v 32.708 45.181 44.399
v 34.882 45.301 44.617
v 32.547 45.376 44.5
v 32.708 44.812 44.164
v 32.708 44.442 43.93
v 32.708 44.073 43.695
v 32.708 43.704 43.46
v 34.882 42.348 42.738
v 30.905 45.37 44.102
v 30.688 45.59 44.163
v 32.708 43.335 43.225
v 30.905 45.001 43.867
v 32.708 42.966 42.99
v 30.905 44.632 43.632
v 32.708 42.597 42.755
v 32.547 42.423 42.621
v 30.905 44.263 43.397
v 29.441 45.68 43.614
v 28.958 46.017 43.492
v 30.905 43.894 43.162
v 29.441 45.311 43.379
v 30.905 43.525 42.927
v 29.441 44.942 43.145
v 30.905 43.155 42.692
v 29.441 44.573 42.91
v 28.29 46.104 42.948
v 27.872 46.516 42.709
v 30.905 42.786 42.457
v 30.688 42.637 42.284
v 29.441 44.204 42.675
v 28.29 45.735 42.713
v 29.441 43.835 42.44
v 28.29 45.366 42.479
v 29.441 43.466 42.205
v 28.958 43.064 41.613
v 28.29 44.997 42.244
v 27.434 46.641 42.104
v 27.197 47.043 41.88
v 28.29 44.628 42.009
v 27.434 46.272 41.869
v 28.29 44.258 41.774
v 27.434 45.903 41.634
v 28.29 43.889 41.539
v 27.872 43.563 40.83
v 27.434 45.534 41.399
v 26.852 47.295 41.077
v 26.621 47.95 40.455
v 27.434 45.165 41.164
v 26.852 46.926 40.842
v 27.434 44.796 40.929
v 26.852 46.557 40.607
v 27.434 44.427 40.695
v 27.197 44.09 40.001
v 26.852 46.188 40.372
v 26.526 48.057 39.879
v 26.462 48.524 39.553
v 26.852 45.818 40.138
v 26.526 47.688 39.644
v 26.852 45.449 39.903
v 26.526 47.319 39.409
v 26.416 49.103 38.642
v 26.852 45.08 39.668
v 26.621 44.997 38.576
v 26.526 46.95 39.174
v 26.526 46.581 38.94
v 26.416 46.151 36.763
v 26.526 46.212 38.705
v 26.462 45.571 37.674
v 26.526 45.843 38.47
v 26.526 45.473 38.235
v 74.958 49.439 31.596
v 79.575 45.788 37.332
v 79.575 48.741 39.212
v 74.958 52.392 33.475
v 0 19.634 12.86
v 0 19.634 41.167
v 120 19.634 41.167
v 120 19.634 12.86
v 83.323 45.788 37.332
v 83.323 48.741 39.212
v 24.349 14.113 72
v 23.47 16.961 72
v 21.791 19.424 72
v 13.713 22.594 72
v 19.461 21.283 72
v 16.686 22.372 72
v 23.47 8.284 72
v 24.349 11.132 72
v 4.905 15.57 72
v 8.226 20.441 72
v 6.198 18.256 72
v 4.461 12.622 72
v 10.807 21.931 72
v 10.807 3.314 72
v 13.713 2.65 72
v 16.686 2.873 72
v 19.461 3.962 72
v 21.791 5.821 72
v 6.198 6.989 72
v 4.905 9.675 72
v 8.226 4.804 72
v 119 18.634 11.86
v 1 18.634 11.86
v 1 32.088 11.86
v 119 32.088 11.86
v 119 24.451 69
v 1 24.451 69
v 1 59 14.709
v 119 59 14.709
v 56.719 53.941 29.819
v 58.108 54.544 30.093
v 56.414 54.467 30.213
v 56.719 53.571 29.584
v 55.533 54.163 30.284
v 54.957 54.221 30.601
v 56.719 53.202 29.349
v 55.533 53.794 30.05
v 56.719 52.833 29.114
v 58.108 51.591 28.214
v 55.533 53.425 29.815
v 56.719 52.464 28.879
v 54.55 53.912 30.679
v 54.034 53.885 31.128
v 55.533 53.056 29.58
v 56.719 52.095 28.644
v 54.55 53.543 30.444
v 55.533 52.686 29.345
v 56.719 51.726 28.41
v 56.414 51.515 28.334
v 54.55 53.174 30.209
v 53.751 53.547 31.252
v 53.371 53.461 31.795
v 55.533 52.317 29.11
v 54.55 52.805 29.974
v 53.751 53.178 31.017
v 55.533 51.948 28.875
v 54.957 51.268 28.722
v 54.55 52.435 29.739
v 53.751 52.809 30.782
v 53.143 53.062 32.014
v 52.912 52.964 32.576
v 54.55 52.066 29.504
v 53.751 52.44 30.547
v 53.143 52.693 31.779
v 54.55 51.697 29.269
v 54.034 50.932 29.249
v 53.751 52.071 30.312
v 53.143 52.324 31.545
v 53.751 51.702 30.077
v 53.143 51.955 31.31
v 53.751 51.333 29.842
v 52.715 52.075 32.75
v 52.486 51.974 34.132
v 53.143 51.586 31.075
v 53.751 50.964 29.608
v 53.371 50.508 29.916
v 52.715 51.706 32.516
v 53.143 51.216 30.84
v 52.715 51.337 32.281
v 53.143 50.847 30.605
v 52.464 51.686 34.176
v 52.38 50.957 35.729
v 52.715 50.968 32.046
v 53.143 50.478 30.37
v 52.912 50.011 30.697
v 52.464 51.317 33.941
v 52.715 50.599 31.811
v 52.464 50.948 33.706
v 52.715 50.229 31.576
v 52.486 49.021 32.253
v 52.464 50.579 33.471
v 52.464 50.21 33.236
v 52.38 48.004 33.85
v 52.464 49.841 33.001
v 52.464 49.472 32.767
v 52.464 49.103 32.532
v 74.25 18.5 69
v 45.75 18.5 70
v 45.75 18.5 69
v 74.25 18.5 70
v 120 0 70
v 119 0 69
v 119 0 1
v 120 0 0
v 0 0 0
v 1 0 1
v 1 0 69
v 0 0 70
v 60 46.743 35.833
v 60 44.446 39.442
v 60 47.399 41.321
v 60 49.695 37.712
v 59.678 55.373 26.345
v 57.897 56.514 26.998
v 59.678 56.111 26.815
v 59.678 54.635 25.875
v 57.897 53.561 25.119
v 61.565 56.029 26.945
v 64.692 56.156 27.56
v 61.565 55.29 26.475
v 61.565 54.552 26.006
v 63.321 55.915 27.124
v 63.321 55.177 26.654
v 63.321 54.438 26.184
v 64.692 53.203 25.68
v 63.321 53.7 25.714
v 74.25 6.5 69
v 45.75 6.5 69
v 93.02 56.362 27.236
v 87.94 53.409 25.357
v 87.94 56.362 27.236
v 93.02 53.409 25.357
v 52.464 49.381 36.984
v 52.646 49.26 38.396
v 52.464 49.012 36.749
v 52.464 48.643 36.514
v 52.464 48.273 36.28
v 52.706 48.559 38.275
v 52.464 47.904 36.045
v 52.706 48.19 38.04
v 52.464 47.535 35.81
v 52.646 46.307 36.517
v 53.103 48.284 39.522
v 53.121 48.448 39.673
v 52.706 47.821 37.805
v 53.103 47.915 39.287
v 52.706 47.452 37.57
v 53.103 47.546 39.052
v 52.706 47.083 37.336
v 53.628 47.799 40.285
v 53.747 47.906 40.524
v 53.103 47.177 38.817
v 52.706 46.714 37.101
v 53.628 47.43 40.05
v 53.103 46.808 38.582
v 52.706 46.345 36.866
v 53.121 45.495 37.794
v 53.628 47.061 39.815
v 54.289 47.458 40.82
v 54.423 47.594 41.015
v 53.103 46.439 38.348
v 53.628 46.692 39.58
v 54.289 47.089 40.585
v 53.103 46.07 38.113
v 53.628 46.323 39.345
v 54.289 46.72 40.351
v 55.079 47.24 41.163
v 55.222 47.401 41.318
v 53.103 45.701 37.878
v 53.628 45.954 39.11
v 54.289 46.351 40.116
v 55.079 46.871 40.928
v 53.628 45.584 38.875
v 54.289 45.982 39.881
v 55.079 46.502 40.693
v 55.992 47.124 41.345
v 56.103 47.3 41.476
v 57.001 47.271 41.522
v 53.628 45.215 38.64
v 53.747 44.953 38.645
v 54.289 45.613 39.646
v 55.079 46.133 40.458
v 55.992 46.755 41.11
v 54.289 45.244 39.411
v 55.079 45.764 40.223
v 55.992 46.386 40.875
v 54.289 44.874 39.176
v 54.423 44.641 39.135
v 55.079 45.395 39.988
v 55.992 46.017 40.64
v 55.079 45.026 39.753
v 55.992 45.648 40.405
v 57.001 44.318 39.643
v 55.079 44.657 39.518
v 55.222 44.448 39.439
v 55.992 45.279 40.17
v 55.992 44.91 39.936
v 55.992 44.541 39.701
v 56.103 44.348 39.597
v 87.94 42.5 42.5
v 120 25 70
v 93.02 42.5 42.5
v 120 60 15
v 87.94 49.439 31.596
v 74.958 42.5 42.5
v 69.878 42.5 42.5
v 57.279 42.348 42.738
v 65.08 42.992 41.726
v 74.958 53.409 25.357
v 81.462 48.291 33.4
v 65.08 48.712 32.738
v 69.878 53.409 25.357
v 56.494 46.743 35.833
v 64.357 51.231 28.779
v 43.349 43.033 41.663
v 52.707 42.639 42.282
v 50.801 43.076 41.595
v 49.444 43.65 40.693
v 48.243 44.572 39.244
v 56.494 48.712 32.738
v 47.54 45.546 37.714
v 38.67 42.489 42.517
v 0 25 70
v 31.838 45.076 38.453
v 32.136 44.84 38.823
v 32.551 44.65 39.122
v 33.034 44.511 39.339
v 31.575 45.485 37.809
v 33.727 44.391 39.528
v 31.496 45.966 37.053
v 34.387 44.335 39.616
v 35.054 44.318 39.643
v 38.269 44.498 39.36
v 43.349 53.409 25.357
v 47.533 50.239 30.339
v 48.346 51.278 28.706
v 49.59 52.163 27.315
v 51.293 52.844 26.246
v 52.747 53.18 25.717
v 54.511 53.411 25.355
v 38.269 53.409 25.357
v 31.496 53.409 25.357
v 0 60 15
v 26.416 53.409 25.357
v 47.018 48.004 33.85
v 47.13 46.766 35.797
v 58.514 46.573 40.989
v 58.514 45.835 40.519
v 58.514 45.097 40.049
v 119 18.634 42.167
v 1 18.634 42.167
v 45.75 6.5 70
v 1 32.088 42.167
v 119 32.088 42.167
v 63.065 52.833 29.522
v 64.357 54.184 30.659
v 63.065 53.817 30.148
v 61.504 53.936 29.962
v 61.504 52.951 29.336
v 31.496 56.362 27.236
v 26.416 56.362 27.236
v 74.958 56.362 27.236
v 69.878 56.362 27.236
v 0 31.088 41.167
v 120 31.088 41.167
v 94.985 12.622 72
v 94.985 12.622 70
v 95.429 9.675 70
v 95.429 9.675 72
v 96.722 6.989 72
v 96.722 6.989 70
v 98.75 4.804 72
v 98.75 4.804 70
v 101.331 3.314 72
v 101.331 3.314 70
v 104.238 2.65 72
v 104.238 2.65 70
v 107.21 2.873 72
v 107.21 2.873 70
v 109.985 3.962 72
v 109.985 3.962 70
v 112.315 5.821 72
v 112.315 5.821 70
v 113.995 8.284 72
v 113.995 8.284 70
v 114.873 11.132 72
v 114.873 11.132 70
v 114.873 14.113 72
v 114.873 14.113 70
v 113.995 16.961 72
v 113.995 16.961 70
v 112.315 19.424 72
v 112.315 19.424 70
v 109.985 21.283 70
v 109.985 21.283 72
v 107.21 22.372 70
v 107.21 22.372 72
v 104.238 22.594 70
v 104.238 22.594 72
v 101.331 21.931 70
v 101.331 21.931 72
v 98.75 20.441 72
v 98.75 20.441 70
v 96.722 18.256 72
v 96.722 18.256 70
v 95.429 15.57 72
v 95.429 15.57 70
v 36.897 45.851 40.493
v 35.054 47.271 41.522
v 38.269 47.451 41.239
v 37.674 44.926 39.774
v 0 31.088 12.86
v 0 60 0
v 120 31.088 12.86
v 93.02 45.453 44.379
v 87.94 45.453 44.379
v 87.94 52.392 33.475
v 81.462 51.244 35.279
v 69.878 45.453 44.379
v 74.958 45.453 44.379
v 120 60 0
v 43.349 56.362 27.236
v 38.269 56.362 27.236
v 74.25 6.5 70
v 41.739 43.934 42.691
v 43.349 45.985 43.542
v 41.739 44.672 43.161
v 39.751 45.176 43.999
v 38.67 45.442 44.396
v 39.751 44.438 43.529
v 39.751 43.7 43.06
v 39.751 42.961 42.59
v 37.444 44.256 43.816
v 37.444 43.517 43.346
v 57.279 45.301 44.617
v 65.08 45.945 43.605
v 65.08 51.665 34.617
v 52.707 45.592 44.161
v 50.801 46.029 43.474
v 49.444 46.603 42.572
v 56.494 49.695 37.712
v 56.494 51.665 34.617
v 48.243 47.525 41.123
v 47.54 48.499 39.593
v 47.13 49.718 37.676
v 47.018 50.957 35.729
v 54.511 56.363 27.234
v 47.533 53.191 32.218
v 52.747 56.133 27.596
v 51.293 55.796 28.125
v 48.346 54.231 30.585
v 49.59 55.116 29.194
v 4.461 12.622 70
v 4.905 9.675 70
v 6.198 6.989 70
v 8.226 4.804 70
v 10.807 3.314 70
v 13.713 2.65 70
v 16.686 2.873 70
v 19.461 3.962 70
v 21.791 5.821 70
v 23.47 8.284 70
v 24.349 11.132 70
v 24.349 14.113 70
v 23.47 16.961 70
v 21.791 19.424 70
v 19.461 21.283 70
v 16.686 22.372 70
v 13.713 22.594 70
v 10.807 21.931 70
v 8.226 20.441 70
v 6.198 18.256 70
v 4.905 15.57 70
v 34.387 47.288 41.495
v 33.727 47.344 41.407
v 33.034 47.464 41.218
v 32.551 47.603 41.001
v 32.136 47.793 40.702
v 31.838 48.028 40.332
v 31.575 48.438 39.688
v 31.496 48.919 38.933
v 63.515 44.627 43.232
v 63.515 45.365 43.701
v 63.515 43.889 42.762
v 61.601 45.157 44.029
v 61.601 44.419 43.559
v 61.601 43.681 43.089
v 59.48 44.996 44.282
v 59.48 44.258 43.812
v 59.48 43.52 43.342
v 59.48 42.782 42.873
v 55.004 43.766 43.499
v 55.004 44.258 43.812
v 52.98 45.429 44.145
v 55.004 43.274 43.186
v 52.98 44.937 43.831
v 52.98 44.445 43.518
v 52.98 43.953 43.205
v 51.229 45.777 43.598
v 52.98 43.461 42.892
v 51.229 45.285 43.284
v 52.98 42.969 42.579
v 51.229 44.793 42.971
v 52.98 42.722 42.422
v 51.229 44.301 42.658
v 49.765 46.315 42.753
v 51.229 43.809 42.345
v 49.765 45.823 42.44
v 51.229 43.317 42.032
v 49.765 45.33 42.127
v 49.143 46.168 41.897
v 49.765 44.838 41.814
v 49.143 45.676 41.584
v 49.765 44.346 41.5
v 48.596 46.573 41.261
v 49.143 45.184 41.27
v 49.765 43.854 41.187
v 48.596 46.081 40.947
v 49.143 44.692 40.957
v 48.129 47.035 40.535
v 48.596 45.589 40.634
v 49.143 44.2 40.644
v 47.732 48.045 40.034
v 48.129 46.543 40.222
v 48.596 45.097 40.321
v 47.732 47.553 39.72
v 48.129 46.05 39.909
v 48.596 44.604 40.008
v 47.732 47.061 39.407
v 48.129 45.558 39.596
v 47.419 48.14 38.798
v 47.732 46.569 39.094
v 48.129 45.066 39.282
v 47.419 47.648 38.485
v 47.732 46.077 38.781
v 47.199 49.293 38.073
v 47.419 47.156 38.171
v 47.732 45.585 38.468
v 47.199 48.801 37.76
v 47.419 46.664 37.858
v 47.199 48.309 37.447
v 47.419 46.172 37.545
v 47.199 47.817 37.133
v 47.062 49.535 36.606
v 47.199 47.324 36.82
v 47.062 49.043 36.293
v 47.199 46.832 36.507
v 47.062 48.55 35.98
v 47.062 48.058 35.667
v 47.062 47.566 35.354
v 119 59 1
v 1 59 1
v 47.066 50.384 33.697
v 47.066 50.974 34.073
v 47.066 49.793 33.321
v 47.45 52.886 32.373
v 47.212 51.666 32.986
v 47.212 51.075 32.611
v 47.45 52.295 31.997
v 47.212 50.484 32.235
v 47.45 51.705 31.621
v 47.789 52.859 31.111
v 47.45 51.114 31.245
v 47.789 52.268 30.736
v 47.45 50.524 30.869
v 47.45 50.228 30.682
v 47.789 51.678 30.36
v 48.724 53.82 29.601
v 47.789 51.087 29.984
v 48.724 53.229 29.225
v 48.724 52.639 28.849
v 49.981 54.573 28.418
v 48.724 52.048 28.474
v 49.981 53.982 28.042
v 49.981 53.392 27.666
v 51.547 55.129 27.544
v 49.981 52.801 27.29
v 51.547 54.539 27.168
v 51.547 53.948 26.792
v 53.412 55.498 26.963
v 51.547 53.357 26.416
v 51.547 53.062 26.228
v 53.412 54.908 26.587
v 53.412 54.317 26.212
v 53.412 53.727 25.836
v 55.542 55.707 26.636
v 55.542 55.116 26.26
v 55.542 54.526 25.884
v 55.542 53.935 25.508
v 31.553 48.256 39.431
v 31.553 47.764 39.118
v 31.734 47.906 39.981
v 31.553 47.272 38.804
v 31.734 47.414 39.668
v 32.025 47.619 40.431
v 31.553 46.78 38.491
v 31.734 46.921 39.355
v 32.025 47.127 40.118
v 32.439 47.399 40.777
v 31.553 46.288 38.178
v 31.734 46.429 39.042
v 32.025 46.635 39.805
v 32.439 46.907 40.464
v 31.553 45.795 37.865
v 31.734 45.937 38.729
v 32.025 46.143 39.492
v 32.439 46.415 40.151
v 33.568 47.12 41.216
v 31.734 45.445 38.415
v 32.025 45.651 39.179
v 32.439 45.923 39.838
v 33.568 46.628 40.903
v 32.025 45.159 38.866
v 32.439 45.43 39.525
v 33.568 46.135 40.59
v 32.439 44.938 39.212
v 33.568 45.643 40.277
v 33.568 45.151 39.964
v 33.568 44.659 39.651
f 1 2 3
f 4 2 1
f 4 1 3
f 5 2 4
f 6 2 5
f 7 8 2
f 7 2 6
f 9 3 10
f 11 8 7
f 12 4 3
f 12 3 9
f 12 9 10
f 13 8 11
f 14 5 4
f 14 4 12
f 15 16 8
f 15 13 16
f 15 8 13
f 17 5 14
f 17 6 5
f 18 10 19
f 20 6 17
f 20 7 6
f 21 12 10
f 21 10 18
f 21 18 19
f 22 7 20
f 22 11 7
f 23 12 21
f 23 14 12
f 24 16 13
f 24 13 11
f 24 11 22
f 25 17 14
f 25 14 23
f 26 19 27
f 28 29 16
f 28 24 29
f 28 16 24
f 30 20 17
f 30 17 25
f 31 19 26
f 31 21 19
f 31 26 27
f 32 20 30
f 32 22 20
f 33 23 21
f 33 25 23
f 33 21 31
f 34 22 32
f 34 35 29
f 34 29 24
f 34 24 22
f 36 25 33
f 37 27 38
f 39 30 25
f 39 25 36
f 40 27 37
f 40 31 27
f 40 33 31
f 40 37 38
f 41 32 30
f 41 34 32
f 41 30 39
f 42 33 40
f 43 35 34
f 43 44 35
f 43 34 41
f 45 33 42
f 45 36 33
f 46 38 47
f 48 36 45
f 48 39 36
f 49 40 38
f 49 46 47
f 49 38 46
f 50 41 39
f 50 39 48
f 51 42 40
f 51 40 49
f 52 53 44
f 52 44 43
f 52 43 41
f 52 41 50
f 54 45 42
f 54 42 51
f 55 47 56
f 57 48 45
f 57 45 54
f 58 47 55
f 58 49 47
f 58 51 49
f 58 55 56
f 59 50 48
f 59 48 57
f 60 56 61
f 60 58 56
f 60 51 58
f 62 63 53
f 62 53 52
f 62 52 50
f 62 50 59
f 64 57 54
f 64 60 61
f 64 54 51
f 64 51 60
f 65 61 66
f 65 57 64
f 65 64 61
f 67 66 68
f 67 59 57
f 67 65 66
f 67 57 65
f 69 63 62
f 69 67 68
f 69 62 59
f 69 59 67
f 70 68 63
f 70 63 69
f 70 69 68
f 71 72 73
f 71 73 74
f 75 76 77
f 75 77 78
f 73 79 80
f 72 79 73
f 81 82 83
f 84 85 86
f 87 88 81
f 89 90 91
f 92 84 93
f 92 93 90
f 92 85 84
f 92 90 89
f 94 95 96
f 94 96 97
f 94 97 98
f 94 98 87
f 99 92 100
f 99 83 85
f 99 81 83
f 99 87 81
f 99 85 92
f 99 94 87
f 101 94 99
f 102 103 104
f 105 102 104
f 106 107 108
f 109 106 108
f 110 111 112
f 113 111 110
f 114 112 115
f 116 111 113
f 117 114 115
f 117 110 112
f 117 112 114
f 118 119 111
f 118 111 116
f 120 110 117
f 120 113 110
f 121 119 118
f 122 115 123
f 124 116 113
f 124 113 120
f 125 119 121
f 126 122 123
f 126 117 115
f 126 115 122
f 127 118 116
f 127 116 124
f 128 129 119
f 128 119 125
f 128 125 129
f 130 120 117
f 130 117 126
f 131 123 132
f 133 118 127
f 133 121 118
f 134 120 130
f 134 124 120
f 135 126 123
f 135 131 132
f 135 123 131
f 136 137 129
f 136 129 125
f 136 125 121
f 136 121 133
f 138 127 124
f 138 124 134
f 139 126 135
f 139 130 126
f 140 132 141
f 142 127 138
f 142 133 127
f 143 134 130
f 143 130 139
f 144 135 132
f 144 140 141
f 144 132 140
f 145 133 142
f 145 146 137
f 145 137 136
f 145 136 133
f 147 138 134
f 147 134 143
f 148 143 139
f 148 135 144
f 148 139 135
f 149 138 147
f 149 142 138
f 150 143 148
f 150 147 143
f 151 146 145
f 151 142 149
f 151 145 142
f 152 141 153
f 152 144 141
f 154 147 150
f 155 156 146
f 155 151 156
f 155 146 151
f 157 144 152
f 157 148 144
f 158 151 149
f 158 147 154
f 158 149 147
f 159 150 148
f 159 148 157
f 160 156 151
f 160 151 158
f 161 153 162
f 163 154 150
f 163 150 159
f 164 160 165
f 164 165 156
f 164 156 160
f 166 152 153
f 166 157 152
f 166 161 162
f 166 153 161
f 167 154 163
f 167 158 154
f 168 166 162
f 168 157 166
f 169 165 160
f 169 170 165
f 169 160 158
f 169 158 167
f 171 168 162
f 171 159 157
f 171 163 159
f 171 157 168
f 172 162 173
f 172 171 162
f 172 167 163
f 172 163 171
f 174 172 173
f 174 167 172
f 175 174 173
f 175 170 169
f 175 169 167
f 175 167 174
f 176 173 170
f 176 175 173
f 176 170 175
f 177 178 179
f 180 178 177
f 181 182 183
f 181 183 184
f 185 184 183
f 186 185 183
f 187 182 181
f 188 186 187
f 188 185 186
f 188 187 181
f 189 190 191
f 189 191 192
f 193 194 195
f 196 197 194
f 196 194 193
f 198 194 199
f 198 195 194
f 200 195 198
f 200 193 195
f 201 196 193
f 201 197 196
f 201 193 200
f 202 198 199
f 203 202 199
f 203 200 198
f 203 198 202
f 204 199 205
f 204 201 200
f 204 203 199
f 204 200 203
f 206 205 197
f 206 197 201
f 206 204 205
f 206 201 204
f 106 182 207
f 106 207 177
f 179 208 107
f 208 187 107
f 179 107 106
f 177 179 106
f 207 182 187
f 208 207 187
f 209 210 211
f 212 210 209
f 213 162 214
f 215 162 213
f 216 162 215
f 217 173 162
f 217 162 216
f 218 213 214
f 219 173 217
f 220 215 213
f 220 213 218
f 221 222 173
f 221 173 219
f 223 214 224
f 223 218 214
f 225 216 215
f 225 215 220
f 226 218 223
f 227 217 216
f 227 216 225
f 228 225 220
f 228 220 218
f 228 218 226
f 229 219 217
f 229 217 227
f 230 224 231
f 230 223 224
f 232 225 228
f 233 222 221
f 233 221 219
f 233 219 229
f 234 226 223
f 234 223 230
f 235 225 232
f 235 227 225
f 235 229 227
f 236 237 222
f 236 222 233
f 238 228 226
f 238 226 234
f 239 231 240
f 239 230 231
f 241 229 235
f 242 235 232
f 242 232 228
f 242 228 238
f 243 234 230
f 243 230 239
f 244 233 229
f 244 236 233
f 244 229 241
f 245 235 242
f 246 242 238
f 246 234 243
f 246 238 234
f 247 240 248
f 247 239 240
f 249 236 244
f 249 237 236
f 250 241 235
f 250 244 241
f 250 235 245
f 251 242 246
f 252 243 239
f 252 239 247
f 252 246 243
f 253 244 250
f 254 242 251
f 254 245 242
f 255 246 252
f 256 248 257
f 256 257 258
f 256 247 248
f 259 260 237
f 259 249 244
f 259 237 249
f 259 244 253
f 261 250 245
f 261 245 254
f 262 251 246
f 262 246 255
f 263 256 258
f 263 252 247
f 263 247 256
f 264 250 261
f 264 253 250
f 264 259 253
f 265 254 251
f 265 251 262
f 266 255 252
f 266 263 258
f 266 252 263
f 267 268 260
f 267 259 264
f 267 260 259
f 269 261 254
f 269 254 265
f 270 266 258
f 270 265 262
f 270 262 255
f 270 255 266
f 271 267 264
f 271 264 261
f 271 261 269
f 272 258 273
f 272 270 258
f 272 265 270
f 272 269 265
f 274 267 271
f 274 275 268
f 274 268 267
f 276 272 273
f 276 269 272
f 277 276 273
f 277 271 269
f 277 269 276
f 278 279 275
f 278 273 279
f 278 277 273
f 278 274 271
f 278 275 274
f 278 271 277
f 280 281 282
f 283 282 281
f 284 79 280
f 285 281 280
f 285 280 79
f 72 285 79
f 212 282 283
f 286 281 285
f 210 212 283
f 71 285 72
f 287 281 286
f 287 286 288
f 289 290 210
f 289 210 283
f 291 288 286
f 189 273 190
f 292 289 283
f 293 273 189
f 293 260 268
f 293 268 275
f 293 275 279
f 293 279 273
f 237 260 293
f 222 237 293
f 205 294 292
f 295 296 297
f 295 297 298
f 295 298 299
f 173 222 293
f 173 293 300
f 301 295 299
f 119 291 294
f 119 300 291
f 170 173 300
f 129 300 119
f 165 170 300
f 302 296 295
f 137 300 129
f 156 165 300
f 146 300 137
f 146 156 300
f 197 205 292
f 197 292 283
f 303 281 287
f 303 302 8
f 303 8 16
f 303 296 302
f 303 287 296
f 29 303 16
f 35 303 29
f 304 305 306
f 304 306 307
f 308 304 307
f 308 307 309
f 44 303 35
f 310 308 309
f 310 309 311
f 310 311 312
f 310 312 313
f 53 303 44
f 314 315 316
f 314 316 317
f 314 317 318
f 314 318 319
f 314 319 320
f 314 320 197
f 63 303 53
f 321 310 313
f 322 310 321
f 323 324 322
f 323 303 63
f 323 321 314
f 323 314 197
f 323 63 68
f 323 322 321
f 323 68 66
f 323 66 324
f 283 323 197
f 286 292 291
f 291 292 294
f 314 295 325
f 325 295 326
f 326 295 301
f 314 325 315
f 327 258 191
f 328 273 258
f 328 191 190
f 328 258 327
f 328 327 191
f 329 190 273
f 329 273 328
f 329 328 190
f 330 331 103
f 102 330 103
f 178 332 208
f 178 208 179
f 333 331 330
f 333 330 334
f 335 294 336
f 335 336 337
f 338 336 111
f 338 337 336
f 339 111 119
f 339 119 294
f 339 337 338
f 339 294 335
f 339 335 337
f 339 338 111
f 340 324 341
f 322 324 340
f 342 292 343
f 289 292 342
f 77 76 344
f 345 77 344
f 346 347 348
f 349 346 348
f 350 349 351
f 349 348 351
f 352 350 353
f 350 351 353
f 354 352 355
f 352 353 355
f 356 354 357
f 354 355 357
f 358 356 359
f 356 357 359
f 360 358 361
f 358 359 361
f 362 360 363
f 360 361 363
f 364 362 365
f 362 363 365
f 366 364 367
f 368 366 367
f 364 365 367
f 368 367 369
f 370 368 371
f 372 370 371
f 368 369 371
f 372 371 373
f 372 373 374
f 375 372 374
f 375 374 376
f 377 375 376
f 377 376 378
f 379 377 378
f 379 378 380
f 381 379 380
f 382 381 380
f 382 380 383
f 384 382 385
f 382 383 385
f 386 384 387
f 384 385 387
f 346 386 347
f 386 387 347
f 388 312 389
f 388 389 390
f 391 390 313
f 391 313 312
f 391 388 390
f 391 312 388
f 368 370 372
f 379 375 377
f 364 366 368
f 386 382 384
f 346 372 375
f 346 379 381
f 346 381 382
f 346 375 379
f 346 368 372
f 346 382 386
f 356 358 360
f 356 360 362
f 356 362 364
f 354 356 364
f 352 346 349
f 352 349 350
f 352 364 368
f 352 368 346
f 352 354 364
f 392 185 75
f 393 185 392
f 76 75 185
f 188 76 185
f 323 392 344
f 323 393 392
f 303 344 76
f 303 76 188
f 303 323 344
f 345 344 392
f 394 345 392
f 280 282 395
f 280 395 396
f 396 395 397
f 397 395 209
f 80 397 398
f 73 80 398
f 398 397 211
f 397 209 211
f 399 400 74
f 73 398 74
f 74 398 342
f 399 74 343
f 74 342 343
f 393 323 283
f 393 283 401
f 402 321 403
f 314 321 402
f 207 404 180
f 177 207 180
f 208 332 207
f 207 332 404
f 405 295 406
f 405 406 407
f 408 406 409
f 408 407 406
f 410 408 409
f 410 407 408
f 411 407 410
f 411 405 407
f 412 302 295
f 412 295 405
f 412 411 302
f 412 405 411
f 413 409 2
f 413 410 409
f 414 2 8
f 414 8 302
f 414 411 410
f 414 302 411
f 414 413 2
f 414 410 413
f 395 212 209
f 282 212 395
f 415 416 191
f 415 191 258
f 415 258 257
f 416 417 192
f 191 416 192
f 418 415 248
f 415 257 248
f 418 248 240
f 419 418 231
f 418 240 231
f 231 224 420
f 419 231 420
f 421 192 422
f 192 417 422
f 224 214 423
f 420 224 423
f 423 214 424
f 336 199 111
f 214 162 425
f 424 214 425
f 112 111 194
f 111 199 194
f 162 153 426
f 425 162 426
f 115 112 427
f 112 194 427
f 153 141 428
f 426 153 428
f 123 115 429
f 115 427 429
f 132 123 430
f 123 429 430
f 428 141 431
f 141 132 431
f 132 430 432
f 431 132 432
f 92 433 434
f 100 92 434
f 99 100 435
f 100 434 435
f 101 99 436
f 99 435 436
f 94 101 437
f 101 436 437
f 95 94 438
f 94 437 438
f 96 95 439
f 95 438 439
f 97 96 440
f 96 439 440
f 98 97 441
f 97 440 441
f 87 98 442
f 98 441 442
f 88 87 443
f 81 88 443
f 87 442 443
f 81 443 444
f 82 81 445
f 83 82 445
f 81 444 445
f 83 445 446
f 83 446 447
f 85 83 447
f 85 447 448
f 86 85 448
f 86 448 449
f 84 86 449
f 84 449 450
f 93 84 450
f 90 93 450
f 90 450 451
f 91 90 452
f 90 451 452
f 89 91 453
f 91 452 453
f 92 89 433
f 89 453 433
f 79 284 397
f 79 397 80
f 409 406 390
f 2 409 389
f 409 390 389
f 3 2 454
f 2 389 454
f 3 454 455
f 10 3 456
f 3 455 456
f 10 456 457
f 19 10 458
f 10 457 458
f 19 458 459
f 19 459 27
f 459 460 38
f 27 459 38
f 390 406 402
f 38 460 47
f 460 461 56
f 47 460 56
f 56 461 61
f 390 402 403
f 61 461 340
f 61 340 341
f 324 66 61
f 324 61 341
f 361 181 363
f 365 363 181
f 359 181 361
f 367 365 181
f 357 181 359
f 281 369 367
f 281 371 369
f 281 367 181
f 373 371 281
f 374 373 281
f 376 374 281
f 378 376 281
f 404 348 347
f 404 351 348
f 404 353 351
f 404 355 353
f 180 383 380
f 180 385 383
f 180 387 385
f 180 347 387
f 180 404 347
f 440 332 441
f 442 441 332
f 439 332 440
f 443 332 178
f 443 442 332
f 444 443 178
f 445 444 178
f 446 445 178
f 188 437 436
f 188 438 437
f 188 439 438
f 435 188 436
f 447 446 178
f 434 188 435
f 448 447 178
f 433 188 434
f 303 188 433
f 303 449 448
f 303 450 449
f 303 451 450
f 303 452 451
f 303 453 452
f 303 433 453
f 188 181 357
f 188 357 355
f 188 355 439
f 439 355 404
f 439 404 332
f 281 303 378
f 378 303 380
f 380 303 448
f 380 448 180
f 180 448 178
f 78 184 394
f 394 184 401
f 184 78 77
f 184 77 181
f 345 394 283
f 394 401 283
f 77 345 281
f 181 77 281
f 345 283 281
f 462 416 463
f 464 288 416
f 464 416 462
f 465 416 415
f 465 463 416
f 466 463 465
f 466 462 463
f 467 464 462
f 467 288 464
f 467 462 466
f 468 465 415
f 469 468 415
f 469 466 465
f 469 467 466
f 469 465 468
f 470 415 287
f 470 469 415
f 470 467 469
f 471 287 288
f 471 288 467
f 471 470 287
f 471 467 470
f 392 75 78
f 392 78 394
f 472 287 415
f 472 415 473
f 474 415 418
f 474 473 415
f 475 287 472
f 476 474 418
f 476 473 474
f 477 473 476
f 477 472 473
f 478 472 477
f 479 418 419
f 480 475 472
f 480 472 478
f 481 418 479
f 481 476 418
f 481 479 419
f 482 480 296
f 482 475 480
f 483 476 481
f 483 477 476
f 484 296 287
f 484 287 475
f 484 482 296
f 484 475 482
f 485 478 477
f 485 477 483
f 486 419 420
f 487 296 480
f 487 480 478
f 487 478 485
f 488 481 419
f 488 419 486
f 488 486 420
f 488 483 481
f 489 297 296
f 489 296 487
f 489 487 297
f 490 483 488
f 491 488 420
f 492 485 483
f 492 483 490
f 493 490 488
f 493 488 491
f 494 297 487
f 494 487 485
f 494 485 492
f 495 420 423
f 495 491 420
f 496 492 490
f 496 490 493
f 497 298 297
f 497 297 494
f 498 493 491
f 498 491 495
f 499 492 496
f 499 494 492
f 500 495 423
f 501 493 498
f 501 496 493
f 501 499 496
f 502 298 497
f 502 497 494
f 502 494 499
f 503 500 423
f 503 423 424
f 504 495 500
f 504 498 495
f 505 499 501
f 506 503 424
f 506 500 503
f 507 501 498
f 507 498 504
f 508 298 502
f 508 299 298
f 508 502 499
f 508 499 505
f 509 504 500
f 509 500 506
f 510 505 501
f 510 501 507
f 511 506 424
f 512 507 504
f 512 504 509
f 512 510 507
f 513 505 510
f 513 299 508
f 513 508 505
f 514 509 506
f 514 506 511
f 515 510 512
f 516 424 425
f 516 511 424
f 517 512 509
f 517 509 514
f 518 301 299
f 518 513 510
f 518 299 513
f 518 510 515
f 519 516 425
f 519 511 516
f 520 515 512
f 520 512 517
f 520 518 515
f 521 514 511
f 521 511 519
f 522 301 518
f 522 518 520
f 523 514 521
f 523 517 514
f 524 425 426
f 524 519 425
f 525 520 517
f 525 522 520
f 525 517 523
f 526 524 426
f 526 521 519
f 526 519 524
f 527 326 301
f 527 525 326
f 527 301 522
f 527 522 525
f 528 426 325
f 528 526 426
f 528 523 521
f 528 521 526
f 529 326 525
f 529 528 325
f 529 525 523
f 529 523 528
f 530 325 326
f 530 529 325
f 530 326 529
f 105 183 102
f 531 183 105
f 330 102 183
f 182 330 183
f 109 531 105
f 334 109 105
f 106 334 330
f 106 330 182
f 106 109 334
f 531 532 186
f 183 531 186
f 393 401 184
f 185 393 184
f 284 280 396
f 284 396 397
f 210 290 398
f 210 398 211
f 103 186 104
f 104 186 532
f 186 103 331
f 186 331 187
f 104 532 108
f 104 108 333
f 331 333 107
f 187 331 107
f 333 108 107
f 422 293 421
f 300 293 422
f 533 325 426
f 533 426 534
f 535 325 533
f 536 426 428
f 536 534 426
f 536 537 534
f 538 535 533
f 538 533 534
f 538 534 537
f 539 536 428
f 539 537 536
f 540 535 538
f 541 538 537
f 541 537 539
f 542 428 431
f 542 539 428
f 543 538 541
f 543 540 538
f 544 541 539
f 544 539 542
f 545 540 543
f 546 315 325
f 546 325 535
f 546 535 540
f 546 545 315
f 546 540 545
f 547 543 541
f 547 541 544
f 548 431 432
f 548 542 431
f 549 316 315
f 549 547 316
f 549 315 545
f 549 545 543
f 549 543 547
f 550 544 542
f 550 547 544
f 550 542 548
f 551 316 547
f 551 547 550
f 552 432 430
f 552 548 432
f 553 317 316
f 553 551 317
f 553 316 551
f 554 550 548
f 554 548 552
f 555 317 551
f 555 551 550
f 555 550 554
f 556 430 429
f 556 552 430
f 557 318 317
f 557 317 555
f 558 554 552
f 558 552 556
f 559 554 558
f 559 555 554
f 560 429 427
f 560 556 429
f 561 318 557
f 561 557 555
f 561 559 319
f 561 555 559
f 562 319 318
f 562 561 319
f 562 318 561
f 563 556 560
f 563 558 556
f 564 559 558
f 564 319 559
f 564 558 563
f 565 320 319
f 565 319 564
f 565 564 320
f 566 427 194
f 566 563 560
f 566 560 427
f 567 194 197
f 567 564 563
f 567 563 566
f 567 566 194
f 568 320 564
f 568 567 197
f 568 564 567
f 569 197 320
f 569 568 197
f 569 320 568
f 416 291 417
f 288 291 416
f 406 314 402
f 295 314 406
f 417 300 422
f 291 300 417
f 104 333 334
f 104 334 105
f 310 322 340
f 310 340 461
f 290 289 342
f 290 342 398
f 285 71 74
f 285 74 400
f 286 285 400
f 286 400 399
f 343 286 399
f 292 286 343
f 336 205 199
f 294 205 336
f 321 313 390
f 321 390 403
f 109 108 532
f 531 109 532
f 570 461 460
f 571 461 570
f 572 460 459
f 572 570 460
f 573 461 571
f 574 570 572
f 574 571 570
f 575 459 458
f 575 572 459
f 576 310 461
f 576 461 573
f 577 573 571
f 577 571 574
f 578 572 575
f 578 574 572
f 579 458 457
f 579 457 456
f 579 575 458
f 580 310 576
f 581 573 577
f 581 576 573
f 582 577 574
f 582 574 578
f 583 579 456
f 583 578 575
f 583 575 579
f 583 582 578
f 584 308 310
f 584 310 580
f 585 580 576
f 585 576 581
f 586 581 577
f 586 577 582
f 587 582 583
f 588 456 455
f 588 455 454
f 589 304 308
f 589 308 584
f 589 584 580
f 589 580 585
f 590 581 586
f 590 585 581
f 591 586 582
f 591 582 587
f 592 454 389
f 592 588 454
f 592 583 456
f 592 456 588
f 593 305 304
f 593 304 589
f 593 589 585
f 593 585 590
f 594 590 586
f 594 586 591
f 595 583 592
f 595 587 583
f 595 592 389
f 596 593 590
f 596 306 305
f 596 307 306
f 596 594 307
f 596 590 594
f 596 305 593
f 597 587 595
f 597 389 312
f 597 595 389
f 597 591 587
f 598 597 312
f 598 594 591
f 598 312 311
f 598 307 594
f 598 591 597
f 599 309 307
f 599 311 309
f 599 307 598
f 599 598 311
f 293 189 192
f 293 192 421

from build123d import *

# Parameters (mm, degrees)
SKETCH2_W           = 28.306958552
SKETCH2_H           = 11.453917389
BOSS_EXTRUDE1_DEPTH = 120
SHELL1_T            = -1
SKETCH3_R           = 10
BOSS_EXTRUDE3_DEPTH = 2
BOSS_EXTRUDE4_DEPTH = 3.5
SKETCH5_W           = 28.5
SKETCH5_H           = 12
CUT_EXTRUDE1_DEPTH  = 3.5


with BuildPart() as part:
    # Sketch2 → Boss-Extrude1 (new body)
    with BuildSketch(Plane(origin=(0, 0, 0), x_dir=(0, 0, -1), z_dir=(1, 0, 0))):
        Polygon((0, 0), (-70, 0), (-70, 25), (-15, 60), (0, 60), align=None)
        with Locations((-27.013142097, 25.361400481)):
            Rectangle(SKETCH2_W, SKETCH2_H, mode=Mode.SUBTRACT)
    extrude(amount=BOSS_EXTRUDE1_DEPTH)

    # Shell1
    shell1_openings = [part.faces().sort_by_distance(p)[0] for p in [
        (60, 0, 35),
    ]]
    offset(amount=SHELL1_T, openings=shell1_openings, kind=Kind.INTERSECTION)

    # Sketch3 → Boss-Extrude3 (add)
    with BuildSketch(Plane.XY.offset(70)):
        with Locations(Location((14.460503184, 12.622362689, 0), (0, 0, 180))):
            Circle(SKETCH3_R)
        with Locations(Location((104.984833399, 12.622362689, 0), (0, 0, 180))):
            Circle(SKETCH3_R)
    extrude(amount=BOSS_EXTRUDE3_DEPTH)

    # Sketch4 → Boss-Extrude4 (add)
    with BuildSketch(Plane(origin=(0, 49.5, 31.5), x_dir=(1, 0, 0), z_dir=(0, 0.8436614877321076, 0.5368754921931594))):
        with BuildLine():
            Line((31.495555556, 7.28159519), (31.495555556, -6.582571477))
            add(Edge.make_bspline(
                [(31.495555556, -6.582571477), (31.497647327, -6.716452984), (31.501705357, -6.976182729), (31.545429981, -7.349903275), (31.620254564, -7.694330516), (31.725797404, -8.007755097), (31.85843149, -8.292023496), (32.017035255, -8.549104595), (32.213580402, -8.769410834), (32.514616663, -9.027825691), (32.965416445, -9.28279655), (33.584183504, -9.496713073), (34.290093212, -9.63052642), (34.790447792, -9.644416316), (35.054201389, -9.651738144)],
                knots=[0, 0, 0, 0, 0.892406739, 1.731266554, 2.504144536, 3.238722317, 3.931504629, 4.59227798, 5.245079782, 5.891448425, 7.23122422, 8.666543773, 10.242823978, 12, 12, 12, 12], degree=3))
            add(Edge.make_bspline(
                [(35.054201389, -9.651738144), (35.371915661, -9.647351405), (35.987813895, -9.638847586), (36.738630256, -9.567280303), (37.293698587, -9.49725925), (37.65928604, -9.438298039), (37.980921199, -9.384777988), (38.177949016, -9.338130022), (38.268888889, -9.316599255)],
                knots=[0, 0, 0, 0, 1.765444015, 3.422363889, 4.188491736, 4.874885831, 5.480693936, 6, 6, 6, 6], degree=3))
            Line((38.268888889, -9.316599255), (38.268888889, 7.28159519))
            Line((38.268888889, 7.28159519), (43.348888889, 7.28159519))
            Line((43.348888889, 7.28159519), (43.348888889, -12.04621731))
            add(Edge.make_bspline(
                [(43.348888889, -12.04621731), (43.096189549, -12.108469187), (42.560643091, -12.240399773), (41.708016667, -12.438755514), (40.760798722, -12.647829999), (39.72837029, -12.878596561), (38.613480039, -13.080203608), (37.426291642, -13.215675326), (36.175767269, -13.309081819), (35.320438728, -13.316715841), (34.882222222, -13.320627033)],
                knots=[0, 0, 0, 0, 0.727273077, 1.541311979, 2.446196716, 3.437977513, 4.497566055, 5.610312566, 6.77567458, 8, 8, 8, 8], degree=3))
            add(Edge.make_bspline(
                [(34.882222222, -13.320627033), (34.504262876, -13.314914498), (33.778113064, -13.30393936), (32.735267925, -13.21513127), (31.783524991, -13.074414795), (30.921420697, -12.867783559), (30.146372308, -12.601500494), (29.446115226, -12.292080995), (28.830068546, -11.917580353), (28.282939924, -11.498254497), (27.818160366, -11.016573216), (27.419646968, -10.485522985), (27.09211977, -9.899752382), (26.836782361, -9.259995921), (26.649530032, -8.569422805), (26.515550652, -7.834688866), (26.428130138, -7.052093695), (26.41983098, -6.515200865), (26.415555556, -6.238613144)],
                knots=[0, 0, 0, 0, 1.424825587, 2.737428892, 3.942915469, 5.049168469, 6.074440888, 7.029373324, 7.929451529, 8.786387261, 9.62117339, 10.444717279, 11.283376038, 12.14372783, 13.035182641, 13.976509509, 14.957571058, 16, 16, 16, 16], degree=3))
            Line((26.415555556, -6.238613144), (26.415555556, 7.28159519))
            Line((26.415555556, 7.28159519), (31.495555556, 7.28159519))
        make_face()
        with BuildLine():
            add(Edge.make_bspline(
                [(64.356805556, 3.224650745), (64.152697046, 3.265479221), (63.723461512, 3.351340574), (63.041961215, 3.462909191), (62.29583847, 3.579450279), (61.212104745, 3.717973311), (59.811209671, 3.867682682), (58.676089338, 3.885843376), (58.108229167, 3.894928523)],
                knots=[0, 0, 0, 0, 0.595250767, 1.251798765, 1.974755809, 2.75480843, 4.376546534, 6, 6, 6, 6], degree=3))
            add(Edge.make_bspline(
                [(58.108229167, 3.894928523), (57.866952661, 3.891547515), (57.40238535, 3.885037532), (56.73040283, 3.811402786), (56.110259397, 3.700425968), (55.539401639, 3.541723685), (55.018275771, 3.335491675), (54.545861683, 3.07246126), (54.119187516, 2.758203357), (53.73932494, 2.388321122), (53.411594136, 1.958862272), (53.126376495, 1.47215962), (52.890281289, 0.923783122), (52.700878804, 0.312954851), (52.558002514, -0.361956903), (52.452465427, -1.105813902), (52.392758083, -1.921988909), (52.384365104, -2.490252469), (52.38, -2.785800644)],
                knots=[0, 0, 0, 0, 1.133437581, 2.182384265, 3.172832728, 4.091362303, 4.962372543, 5.800406583, 6.625239699, 7.445925786, 8.283247732, 9.156419393, 10.090711351, 11.082628234, 12.157104624, 13.32943025, 14.61106347, 16, 16, 16, 16], degree=3))
            add(Edge.make_bspline(
                [(52.38, -2.785800644), (52.384196723, -3.118101326), (52.392226664, -3.753919963), (52.453172237, -4.660728623), (52.551999251, -5.475433806), (52.690933664, -6.199839009), (52.872671982, -6.841126791), (53.08689051, -7.407019826), (53.332449966, -7.901073543), (53.612537323, -8.323257374), (53.928446967, -8.677755377), (54.282503677, -8.965737434), (54.662550063, -9.204286947), (55.080076889, -9.375736284), (55.526049387, -9.495182682), (55.994151932, -9.589102), (56.490115847, -9.642084068), (56.827818042, -9.648460705), (57.001388889, -9.651738144)],
                knots=[0, 0, 0, 0, 1.673454126, 3.201959486, 4.57468475, 5.80438305, 6.912760951, 7.927383973, 8.847752408, 9.685453157, 10.471760189, 11.229097717, 11.976932424, 12.723483608, 13.492240552, 14.299457069, 15.125961629, 16, 16, 16, 16], degree=3))
            add(Edge.make_bspline(
                [(57.001388889, -9.651738144), (57.242566033, -9.648444955), (57.747594043, -9.641548975), (58.513397038, -9.57931793), (59.271728701, -9.503258107), (59.766374362, -9.442370781), (60, -9.413613144)],
                knots=[0, 0, 0, 0, 0.961374604, 2.013130658, 3.061583563, 4, 4, 4, 4], degree=3))
            Line((60, -9.413613144), (60, -5.136182588))
            Line((60, -5.136182588), (56.494270833, -5.136182588))
            Line((56.494270833, -5.136182588), (56.494270833, -1.467293699))
            Line((56.494270833, -1.467293699), (65.08, -1.467293699))
            Line((65.08, -1.467293699), (65.08, -12.121182588))
            add(Edge.make_bspline(
                [(65.08, -12.121182588), (64.839162189, -12.185262296), (64.319249791, -12.32359537), (63.48922284, -12.523718247), (62.569821699, -12.718386963), (61.587737426, -12.910998872), (60.550412746, -13.071297466), (59.476477777, -13.210276189), (58.380235988, -13.301780667), (57.645379742, -13.314359172), (57.279201389, -13.320627033)],
                knots=[0, 0, 0, 0, 0.755794281, 1.631582744, 2.588976596, 3.605760095, 4.666252689, 5.771549146, 6.889564499, 8, 8, 8, 8], degree=3))
            add(Edge.make_bspline(
                [(57.279201389, -13.320627033), (56.889513874, -13.314630804), (56.129685347, -13.302939114), (55.022260593, -13.214317278), (53.977001934, -13.068115209), (52.991445011, -12.873539155), (52.074025504, -12.591714386), (51.225843147, -12.226132778), (50.455091299, -11.762640122), (49.866957383, -11.308619162), (49.437870421, -10.898615459), (49.137720463, -10.560848798), (48.853553039, -10.197957504), (48.591133595, -9.806679294), (48.346191057, -9.388659543), (48.123831144, -8.944055848), (47.914563451, -8.473869404), (47.724821117, -7.97527371), (47.556866599, -7.443814271), (47.413113475, -6.879657909), (47.287128379, -6.28138145), (47.19474622, -5.647516108), (47.11363965, -4.980235153), (47.05618482, -4.280100825), (47.027329608, -3.5445168), (47.021016482, -3.043055789), (47.017777778, -2.785800644)],
                knots=[0, 0, 0, 0, 1.640766254, 3.199232612, 4.674144897, 6.083442838, 7.424489995, 8.707789567, 9.962455245, 11.201775806, 11.827763747, 12.458962377, 13.10278022, 13.767126437, 14.441204247, 15.14151096, 15.859189204, 16.60751955, 17.386599082, 18.204749424, 19.058103002, 19.959719952, 20.900938005, 21.888338343, 22.916693792, 24, 24, 24, 24], degree=3))
            add(Edge.make_bspline(
                [(47.017777778, -2.785800644), (47.020628796, -2.546168569), (47.026211518, -2.076932884), (47.06082015, -1.386885284), (47.122591725, -0.727947698), (47.206582105, -0.098344535), (47.311213943, 0.502492016), (47.441555443, 1.074288834), (47.602601185, 1.6150534), (47.838760081, 2.288312532), (48.193444972, 3.068600834), (48.700360125, 3.924608099), (49.295402807, 4.679017259), (49.968787038, 5.339138985), (50.718272671, 5.907422518), (51.547607876, 6.379904626), (52.447590869, 6.770661477), (53.42293726, 7.065844151), (54.461089467, 7.286413605), (55.555206299, 7.449289699), (56.707046728, 7.548152282), (57.49360801, 7.55851077), (57.8965625, 7.563817412)],
                knots=[0, 0, 0, 0, 0.830523012, 1.626289114, 2.393765786, 3.123613252, 3.827153004, 4.506826794, 5.154833919, 5.781607132, 6.978567384, 8.118716626, 9.221456624, 10.298587739, 11.378606288, 12.471761326, 13.598907335, 14.771984998, 15.997030156, 17.274417513, 18.603687055, 20, 20, 20, 20], degree=3))
            add(Edge.make_bspline(
                [(57.8965625, 7.563817412), (58.181795123, 7.561761396), (58.776171037, 7.557477012), (59.687545429, 7.503809961), (60.625305238, 7.434475444), (61.555873436, 7.350783248), (62.453370731, 7.257685343), (63.289275957, 7.142331595), (64.031358868, 7.030292802), (64.486422582, 6.939124145), (64.691944444, 6.897949356)],
                knots=[0, 0, 0, 0, 1.001170159, 2.086267066, 3.203892355, 4.302208362, 5.366093373, 6.37097994, 7.264280522, 8, 8, 8, 8], degree=3))
            Line((64.691944444, 6.897949356), (64.356805556, 3.224650745))
        make_face()
        Polygon((79.574756944, -6.913300644), (74.957777778, -0.113508977), (74.957777778, -13.03840481), (69.877777778, -13.03840481), (69.877777778, 7.28159519), (74.957777778, 7.28159519), (81.462118056, -2.252224255), (87.94, 7.28159519), (93.02, 7.28159519), (93.02, -13.03840481), (87.94, -13.03840481), (87.94, -0.113508977), (83.323020833, -6.913300644), align=None)
    extrude(amount=BOSS_EXTRUDE4_DEPTH)

    # Sketch5 → Cut-Extrude1 (cut)
    with BuildSketch(Plane.XY.offset(70)):
        with Locations((60, 12.5)):
            Rectangle(SKETCH5_W, SKETCH5_H)
    extrude(amount=-CUT_EXTRUDE1_DEPTH, mode=Mode.SUBTRACT)


solid = part.part
